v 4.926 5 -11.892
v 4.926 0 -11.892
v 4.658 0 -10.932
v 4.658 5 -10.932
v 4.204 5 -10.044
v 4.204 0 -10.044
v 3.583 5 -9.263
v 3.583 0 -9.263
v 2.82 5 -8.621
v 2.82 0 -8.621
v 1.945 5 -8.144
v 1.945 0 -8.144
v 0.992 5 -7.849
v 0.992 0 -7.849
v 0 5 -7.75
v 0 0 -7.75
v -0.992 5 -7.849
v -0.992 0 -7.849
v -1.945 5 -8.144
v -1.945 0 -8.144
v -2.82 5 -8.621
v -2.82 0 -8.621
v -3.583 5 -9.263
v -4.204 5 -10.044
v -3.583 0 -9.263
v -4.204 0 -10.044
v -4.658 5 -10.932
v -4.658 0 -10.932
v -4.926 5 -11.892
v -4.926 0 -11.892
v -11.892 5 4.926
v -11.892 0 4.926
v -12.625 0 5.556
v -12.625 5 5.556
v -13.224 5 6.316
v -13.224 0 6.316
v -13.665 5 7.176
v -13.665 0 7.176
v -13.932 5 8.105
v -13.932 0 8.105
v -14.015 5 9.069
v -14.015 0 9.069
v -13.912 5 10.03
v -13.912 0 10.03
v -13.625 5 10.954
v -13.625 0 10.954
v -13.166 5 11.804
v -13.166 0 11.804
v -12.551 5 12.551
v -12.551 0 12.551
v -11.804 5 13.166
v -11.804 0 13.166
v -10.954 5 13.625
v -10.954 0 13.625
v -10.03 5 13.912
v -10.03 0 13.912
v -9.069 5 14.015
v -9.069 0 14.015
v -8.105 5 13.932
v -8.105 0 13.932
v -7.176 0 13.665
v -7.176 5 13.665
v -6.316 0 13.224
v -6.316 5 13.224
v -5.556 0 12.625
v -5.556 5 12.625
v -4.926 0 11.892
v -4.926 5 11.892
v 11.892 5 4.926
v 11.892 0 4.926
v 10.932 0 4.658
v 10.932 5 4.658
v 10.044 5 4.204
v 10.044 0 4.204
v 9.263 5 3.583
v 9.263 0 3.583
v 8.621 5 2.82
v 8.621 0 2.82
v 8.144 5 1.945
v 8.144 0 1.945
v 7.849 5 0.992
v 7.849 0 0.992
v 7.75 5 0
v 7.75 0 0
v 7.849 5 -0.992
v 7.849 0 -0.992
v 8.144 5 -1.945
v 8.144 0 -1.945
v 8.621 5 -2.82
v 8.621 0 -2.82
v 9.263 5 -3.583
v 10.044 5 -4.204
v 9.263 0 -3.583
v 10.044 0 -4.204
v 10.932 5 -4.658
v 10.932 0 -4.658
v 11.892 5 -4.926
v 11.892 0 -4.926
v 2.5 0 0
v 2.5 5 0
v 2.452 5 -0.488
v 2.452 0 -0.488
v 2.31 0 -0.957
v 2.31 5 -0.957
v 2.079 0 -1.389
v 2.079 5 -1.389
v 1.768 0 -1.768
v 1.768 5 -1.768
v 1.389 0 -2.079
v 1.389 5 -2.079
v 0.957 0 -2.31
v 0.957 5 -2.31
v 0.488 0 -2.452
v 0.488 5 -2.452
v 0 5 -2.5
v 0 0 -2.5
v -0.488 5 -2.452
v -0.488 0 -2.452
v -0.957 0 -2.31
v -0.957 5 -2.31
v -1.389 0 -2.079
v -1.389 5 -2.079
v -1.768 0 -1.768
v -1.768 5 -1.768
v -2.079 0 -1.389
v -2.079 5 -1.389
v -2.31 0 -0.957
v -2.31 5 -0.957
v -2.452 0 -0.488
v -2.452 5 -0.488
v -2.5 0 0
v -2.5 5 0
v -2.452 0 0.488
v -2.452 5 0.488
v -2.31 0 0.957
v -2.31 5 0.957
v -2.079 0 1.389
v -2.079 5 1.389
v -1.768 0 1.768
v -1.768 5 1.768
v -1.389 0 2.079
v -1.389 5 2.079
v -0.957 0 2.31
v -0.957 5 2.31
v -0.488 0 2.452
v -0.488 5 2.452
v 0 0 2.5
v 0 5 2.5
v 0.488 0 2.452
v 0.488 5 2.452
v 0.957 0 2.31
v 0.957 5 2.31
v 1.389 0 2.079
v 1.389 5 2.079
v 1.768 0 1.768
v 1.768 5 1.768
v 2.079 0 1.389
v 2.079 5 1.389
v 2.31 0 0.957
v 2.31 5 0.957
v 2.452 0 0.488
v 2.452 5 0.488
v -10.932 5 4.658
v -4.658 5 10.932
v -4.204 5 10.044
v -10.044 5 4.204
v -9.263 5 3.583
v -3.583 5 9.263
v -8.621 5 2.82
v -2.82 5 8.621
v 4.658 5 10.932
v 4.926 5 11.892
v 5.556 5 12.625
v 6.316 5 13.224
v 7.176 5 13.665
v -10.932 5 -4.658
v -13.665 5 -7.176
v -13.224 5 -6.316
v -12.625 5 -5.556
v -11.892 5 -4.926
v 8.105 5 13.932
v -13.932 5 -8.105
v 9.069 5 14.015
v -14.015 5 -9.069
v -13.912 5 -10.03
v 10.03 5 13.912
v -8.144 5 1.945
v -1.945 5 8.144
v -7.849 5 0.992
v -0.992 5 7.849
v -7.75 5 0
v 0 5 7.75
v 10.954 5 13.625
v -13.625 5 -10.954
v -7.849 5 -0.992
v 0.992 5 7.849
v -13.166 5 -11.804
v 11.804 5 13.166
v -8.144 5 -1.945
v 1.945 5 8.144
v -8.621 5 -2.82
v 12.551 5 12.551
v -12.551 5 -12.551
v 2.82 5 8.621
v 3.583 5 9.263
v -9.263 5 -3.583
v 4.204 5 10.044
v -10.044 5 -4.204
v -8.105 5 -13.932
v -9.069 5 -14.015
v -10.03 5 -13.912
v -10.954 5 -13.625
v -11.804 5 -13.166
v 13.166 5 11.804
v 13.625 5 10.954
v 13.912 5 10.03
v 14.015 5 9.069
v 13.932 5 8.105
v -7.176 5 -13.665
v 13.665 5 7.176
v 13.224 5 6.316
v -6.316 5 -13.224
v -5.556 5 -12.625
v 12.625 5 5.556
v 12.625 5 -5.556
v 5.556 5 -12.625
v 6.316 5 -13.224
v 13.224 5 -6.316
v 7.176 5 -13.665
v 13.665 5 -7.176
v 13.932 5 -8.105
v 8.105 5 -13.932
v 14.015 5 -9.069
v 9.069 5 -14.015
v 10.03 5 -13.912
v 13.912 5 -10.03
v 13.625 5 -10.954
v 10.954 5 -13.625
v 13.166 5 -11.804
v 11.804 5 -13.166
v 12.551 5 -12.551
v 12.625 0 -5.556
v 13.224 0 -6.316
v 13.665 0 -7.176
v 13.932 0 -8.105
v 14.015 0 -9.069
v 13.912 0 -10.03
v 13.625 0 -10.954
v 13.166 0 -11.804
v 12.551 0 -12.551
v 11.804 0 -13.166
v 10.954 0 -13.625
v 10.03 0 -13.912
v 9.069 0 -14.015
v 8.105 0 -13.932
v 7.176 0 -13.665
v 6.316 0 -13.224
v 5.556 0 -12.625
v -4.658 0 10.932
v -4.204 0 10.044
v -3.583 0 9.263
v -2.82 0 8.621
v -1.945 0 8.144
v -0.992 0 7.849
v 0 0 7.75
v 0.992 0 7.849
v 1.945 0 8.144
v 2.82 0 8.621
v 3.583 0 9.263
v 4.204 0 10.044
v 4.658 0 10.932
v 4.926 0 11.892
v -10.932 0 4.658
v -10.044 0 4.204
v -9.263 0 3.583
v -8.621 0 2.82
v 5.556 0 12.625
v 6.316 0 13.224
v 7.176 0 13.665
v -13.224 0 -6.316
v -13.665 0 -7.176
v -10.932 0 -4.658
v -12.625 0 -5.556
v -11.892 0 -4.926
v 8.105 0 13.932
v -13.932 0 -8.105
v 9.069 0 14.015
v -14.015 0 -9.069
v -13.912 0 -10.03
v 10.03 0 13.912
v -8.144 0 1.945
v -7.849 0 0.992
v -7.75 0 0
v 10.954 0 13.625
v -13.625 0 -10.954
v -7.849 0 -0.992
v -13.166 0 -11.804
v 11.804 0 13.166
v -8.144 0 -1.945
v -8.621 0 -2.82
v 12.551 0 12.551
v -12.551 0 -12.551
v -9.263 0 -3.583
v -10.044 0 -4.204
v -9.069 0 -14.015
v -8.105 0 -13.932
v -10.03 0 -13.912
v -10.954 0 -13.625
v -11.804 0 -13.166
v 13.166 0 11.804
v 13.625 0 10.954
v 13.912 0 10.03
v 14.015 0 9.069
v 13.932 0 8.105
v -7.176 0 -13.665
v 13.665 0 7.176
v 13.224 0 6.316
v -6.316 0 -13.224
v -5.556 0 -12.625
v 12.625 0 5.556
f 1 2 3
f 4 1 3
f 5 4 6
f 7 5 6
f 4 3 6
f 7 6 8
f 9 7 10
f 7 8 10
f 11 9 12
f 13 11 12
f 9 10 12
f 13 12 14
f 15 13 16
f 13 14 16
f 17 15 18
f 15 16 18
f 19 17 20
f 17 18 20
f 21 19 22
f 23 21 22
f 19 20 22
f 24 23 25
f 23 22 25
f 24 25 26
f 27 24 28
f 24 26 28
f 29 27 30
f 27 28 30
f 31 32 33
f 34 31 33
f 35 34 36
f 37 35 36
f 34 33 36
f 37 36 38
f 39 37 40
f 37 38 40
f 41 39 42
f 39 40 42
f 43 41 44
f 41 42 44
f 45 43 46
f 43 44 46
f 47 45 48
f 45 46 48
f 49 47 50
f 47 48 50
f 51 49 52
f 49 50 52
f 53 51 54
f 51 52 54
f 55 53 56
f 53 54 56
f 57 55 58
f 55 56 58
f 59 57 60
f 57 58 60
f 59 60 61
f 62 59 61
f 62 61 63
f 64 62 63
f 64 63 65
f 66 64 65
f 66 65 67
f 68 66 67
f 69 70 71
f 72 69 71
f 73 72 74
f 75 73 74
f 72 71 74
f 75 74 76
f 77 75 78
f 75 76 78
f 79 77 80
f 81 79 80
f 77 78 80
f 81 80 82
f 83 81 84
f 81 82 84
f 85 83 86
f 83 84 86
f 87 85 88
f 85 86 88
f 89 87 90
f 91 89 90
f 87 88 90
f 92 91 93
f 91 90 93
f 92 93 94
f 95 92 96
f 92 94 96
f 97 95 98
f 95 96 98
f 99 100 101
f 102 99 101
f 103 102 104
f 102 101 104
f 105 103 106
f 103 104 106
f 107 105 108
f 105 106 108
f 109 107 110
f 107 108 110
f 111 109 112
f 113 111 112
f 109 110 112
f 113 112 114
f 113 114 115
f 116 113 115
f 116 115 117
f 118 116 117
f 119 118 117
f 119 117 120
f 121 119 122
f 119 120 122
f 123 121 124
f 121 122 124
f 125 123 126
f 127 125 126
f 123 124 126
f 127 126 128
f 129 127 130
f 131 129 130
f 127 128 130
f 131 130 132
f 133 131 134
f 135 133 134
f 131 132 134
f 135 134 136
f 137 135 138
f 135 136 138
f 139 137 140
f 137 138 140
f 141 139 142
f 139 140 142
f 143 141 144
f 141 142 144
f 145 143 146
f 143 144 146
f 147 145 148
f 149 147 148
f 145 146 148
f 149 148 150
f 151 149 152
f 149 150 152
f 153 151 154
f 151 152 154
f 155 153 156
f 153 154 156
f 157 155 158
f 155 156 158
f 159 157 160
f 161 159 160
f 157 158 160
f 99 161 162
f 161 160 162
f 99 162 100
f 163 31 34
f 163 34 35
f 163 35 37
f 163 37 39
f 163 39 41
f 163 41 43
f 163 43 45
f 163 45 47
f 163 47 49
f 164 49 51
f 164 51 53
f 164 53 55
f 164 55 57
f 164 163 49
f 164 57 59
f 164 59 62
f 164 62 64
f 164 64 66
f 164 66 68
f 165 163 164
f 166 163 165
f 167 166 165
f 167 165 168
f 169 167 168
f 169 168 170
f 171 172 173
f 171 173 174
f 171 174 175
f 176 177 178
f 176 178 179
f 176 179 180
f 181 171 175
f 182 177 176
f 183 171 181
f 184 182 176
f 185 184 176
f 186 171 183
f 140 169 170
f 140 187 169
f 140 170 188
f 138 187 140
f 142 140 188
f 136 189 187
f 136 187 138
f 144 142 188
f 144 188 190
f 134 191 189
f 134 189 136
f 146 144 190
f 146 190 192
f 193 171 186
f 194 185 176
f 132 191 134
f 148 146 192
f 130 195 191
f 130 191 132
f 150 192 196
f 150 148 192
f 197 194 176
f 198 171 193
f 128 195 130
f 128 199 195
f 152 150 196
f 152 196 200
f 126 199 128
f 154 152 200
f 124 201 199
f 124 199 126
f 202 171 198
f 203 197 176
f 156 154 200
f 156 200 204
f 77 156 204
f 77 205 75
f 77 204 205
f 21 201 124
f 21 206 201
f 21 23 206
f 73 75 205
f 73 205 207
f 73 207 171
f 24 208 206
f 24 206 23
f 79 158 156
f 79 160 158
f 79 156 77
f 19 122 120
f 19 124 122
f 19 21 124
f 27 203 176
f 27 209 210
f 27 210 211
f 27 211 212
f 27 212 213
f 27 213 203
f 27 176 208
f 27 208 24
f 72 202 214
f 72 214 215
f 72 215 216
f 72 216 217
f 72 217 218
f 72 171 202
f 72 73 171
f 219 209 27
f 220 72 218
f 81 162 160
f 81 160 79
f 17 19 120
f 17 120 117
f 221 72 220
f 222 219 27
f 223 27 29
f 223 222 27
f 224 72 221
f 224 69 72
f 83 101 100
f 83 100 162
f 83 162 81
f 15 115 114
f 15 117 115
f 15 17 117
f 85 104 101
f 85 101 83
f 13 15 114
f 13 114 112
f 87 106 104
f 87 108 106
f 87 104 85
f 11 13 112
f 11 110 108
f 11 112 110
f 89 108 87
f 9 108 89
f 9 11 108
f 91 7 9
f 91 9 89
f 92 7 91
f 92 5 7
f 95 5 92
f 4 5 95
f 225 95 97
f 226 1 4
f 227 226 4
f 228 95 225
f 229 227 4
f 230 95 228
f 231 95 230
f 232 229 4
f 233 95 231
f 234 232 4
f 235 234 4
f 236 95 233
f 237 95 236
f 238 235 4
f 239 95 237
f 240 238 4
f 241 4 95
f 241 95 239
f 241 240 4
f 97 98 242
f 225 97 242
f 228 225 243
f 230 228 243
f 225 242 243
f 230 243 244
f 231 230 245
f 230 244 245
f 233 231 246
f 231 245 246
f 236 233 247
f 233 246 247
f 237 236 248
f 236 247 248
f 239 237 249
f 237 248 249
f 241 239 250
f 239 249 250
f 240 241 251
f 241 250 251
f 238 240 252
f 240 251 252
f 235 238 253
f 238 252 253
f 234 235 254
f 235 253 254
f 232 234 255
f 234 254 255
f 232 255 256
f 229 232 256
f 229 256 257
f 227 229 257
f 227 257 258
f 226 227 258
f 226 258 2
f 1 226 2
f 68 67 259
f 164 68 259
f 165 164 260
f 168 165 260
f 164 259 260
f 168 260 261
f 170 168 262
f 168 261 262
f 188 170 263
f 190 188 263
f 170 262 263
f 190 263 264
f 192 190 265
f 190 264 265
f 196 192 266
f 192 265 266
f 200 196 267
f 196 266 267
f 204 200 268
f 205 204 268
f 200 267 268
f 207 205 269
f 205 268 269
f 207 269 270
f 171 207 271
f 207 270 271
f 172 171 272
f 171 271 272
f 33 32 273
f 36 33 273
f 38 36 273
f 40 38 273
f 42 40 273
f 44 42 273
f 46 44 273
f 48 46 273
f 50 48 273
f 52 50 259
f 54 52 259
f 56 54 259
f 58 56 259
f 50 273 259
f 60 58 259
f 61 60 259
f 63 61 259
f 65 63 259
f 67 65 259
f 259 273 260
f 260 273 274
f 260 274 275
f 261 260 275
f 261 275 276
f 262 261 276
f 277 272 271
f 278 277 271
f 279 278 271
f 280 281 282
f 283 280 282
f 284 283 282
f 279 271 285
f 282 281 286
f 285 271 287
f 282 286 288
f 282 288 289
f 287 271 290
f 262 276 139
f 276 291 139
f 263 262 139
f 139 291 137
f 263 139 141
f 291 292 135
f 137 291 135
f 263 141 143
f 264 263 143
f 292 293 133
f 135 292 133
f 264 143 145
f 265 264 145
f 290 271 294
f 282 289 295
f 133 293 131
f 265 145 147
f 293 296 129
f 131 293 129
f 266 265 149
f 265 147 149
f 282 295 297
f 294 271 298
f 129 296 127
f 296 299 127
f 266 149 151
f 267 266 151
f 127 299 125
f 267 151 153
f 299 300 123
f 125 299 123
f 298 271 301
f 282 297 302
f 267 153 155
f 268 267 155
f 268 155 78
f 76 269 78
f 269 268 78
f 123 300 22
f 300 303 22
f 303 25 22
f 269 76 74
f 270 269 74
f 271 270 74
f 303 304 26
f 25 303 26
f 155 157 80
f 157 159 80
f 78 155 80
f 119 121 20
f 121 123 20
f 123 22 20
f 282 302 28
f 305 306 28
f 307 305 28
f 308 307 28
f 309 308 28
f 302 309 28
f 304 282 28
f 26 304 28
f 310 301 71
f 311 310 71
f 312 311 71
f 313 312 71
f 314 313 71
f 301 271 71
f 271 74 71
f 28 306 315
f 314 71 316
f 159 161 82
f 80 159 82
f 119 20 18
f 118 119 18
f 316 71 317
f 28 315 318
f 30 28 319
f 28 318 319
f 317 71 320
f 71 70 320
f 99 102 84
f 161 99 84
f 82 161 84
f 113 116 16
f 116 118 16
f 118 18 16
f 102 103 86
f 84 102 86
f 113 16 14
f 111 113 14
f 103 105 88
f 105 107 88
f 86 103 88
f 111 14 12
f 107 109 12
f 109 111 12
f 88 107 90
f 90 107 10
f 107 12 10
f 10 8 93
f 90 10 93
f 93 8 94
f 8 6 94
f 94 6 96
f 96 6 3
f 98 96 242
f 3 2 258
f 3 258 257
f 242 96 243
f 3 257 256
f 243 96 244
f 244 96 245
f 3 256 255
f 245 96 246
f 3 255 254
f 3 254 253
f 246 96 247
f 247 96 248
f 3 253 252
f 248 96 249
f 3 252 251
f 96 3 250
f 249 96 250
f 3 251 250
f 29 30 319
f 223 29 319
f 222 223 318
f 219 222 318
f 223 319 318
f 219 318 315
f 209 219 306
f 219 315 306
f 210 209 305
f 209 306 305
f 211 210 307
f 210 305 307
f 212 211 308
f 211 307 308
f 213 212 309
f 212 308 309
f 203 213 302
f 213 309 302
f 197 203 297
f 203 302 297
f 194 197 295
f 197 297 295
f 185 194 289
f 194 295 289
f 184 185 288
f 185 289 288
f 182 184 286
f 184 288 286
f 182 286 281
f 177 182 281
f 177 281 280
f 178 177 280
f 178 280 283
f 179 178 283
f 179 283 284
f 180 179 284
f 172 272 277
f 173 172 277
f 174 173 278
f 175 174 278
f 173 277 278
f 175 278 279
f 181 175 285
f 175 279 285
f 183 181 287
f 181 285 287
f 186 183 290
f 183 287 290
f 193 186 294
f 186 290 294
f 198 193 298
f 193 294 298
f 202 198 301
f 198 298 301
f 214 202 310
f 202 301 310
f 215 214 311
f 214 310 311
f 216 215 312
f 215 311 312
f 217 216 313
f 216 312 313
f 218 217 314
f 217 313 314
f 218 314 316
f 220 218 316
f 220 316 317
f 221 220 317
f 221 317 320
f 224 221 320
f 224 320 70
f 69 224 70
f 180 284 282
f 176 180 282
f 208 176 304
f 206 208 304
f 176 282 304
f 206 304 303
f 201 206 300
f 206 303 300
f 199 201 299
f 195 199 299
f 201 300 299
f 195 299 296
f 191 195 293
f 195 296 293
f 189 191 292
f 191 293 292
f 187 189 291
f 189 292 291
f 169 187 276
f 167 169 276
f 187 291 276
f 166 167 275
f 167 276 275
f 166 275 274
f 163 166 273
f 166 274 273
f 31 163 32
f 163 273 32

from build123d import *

# Parameters (mm, degrees)
BOSS_EXTRUDE1_DEPTH = 5
SKETCH2_R           = 2.5
CUT_EXTRUDE1_DEPTH  = 5


with BuildPart() as part:
    # Sketch1 → Boss-Extrude1 (new body)
    with BuildSketch(Plane(origin=(0, 0, 0), x_dir=(1, 0, 0), z_dir=(0, 1, 0))):
        with BuildLine():
            ThreePointArc((11.892024371, 4.925837778), (12.551145366, 12.551145366), (4.925837778, 11.892024371))
            ThreePointArc((4.925837778, 11.892024371), (0, 7.75), (-4.925837778, 11.892024371))
            ThreePointArc((-4.925837778, 11.892024371), (-12.551145366, 12.551145366), (-11.892024371, 4.925837778))
            ThreePointArc((-11.892024371, 4.925837778), (-7.75, 0), (-11.892024371, -4.925837778))
            ThreePointArc((-11.892024371, -4.925837778), (-12.551145366, -12.551145366), (-4.925837778, -11.892024371))
            ThreePointArc((-4.925837778, -11.892024371), (0, -7.75), (4.925837778, -11.892024371))
            ThreePointArc((4.925837778, -11.892024371), (12.551145366, -12.551145366), (11.892024371, -4.925837778))
            ThreePointArc((11.892024371, -4.925837778), (7.75, 0), (11.892024371, 4.925837778))
        make_face()
    extrude(amount=BOSS_EXTRUDE1_DEPTH)

    # Sketch2 → Cut-Extrude1 (cut)
    with BuildSketch(Plane(origin=(0, 5, 0), x_dir=(1, 0, 0), z_dir=(0, 1, 0))):
        Circle(SKETCH2_R)
    extrude(amount=-CUT_EXTRUDE1_DEPTH, mode=Mode.SUBTRACT)


solid = part.part
